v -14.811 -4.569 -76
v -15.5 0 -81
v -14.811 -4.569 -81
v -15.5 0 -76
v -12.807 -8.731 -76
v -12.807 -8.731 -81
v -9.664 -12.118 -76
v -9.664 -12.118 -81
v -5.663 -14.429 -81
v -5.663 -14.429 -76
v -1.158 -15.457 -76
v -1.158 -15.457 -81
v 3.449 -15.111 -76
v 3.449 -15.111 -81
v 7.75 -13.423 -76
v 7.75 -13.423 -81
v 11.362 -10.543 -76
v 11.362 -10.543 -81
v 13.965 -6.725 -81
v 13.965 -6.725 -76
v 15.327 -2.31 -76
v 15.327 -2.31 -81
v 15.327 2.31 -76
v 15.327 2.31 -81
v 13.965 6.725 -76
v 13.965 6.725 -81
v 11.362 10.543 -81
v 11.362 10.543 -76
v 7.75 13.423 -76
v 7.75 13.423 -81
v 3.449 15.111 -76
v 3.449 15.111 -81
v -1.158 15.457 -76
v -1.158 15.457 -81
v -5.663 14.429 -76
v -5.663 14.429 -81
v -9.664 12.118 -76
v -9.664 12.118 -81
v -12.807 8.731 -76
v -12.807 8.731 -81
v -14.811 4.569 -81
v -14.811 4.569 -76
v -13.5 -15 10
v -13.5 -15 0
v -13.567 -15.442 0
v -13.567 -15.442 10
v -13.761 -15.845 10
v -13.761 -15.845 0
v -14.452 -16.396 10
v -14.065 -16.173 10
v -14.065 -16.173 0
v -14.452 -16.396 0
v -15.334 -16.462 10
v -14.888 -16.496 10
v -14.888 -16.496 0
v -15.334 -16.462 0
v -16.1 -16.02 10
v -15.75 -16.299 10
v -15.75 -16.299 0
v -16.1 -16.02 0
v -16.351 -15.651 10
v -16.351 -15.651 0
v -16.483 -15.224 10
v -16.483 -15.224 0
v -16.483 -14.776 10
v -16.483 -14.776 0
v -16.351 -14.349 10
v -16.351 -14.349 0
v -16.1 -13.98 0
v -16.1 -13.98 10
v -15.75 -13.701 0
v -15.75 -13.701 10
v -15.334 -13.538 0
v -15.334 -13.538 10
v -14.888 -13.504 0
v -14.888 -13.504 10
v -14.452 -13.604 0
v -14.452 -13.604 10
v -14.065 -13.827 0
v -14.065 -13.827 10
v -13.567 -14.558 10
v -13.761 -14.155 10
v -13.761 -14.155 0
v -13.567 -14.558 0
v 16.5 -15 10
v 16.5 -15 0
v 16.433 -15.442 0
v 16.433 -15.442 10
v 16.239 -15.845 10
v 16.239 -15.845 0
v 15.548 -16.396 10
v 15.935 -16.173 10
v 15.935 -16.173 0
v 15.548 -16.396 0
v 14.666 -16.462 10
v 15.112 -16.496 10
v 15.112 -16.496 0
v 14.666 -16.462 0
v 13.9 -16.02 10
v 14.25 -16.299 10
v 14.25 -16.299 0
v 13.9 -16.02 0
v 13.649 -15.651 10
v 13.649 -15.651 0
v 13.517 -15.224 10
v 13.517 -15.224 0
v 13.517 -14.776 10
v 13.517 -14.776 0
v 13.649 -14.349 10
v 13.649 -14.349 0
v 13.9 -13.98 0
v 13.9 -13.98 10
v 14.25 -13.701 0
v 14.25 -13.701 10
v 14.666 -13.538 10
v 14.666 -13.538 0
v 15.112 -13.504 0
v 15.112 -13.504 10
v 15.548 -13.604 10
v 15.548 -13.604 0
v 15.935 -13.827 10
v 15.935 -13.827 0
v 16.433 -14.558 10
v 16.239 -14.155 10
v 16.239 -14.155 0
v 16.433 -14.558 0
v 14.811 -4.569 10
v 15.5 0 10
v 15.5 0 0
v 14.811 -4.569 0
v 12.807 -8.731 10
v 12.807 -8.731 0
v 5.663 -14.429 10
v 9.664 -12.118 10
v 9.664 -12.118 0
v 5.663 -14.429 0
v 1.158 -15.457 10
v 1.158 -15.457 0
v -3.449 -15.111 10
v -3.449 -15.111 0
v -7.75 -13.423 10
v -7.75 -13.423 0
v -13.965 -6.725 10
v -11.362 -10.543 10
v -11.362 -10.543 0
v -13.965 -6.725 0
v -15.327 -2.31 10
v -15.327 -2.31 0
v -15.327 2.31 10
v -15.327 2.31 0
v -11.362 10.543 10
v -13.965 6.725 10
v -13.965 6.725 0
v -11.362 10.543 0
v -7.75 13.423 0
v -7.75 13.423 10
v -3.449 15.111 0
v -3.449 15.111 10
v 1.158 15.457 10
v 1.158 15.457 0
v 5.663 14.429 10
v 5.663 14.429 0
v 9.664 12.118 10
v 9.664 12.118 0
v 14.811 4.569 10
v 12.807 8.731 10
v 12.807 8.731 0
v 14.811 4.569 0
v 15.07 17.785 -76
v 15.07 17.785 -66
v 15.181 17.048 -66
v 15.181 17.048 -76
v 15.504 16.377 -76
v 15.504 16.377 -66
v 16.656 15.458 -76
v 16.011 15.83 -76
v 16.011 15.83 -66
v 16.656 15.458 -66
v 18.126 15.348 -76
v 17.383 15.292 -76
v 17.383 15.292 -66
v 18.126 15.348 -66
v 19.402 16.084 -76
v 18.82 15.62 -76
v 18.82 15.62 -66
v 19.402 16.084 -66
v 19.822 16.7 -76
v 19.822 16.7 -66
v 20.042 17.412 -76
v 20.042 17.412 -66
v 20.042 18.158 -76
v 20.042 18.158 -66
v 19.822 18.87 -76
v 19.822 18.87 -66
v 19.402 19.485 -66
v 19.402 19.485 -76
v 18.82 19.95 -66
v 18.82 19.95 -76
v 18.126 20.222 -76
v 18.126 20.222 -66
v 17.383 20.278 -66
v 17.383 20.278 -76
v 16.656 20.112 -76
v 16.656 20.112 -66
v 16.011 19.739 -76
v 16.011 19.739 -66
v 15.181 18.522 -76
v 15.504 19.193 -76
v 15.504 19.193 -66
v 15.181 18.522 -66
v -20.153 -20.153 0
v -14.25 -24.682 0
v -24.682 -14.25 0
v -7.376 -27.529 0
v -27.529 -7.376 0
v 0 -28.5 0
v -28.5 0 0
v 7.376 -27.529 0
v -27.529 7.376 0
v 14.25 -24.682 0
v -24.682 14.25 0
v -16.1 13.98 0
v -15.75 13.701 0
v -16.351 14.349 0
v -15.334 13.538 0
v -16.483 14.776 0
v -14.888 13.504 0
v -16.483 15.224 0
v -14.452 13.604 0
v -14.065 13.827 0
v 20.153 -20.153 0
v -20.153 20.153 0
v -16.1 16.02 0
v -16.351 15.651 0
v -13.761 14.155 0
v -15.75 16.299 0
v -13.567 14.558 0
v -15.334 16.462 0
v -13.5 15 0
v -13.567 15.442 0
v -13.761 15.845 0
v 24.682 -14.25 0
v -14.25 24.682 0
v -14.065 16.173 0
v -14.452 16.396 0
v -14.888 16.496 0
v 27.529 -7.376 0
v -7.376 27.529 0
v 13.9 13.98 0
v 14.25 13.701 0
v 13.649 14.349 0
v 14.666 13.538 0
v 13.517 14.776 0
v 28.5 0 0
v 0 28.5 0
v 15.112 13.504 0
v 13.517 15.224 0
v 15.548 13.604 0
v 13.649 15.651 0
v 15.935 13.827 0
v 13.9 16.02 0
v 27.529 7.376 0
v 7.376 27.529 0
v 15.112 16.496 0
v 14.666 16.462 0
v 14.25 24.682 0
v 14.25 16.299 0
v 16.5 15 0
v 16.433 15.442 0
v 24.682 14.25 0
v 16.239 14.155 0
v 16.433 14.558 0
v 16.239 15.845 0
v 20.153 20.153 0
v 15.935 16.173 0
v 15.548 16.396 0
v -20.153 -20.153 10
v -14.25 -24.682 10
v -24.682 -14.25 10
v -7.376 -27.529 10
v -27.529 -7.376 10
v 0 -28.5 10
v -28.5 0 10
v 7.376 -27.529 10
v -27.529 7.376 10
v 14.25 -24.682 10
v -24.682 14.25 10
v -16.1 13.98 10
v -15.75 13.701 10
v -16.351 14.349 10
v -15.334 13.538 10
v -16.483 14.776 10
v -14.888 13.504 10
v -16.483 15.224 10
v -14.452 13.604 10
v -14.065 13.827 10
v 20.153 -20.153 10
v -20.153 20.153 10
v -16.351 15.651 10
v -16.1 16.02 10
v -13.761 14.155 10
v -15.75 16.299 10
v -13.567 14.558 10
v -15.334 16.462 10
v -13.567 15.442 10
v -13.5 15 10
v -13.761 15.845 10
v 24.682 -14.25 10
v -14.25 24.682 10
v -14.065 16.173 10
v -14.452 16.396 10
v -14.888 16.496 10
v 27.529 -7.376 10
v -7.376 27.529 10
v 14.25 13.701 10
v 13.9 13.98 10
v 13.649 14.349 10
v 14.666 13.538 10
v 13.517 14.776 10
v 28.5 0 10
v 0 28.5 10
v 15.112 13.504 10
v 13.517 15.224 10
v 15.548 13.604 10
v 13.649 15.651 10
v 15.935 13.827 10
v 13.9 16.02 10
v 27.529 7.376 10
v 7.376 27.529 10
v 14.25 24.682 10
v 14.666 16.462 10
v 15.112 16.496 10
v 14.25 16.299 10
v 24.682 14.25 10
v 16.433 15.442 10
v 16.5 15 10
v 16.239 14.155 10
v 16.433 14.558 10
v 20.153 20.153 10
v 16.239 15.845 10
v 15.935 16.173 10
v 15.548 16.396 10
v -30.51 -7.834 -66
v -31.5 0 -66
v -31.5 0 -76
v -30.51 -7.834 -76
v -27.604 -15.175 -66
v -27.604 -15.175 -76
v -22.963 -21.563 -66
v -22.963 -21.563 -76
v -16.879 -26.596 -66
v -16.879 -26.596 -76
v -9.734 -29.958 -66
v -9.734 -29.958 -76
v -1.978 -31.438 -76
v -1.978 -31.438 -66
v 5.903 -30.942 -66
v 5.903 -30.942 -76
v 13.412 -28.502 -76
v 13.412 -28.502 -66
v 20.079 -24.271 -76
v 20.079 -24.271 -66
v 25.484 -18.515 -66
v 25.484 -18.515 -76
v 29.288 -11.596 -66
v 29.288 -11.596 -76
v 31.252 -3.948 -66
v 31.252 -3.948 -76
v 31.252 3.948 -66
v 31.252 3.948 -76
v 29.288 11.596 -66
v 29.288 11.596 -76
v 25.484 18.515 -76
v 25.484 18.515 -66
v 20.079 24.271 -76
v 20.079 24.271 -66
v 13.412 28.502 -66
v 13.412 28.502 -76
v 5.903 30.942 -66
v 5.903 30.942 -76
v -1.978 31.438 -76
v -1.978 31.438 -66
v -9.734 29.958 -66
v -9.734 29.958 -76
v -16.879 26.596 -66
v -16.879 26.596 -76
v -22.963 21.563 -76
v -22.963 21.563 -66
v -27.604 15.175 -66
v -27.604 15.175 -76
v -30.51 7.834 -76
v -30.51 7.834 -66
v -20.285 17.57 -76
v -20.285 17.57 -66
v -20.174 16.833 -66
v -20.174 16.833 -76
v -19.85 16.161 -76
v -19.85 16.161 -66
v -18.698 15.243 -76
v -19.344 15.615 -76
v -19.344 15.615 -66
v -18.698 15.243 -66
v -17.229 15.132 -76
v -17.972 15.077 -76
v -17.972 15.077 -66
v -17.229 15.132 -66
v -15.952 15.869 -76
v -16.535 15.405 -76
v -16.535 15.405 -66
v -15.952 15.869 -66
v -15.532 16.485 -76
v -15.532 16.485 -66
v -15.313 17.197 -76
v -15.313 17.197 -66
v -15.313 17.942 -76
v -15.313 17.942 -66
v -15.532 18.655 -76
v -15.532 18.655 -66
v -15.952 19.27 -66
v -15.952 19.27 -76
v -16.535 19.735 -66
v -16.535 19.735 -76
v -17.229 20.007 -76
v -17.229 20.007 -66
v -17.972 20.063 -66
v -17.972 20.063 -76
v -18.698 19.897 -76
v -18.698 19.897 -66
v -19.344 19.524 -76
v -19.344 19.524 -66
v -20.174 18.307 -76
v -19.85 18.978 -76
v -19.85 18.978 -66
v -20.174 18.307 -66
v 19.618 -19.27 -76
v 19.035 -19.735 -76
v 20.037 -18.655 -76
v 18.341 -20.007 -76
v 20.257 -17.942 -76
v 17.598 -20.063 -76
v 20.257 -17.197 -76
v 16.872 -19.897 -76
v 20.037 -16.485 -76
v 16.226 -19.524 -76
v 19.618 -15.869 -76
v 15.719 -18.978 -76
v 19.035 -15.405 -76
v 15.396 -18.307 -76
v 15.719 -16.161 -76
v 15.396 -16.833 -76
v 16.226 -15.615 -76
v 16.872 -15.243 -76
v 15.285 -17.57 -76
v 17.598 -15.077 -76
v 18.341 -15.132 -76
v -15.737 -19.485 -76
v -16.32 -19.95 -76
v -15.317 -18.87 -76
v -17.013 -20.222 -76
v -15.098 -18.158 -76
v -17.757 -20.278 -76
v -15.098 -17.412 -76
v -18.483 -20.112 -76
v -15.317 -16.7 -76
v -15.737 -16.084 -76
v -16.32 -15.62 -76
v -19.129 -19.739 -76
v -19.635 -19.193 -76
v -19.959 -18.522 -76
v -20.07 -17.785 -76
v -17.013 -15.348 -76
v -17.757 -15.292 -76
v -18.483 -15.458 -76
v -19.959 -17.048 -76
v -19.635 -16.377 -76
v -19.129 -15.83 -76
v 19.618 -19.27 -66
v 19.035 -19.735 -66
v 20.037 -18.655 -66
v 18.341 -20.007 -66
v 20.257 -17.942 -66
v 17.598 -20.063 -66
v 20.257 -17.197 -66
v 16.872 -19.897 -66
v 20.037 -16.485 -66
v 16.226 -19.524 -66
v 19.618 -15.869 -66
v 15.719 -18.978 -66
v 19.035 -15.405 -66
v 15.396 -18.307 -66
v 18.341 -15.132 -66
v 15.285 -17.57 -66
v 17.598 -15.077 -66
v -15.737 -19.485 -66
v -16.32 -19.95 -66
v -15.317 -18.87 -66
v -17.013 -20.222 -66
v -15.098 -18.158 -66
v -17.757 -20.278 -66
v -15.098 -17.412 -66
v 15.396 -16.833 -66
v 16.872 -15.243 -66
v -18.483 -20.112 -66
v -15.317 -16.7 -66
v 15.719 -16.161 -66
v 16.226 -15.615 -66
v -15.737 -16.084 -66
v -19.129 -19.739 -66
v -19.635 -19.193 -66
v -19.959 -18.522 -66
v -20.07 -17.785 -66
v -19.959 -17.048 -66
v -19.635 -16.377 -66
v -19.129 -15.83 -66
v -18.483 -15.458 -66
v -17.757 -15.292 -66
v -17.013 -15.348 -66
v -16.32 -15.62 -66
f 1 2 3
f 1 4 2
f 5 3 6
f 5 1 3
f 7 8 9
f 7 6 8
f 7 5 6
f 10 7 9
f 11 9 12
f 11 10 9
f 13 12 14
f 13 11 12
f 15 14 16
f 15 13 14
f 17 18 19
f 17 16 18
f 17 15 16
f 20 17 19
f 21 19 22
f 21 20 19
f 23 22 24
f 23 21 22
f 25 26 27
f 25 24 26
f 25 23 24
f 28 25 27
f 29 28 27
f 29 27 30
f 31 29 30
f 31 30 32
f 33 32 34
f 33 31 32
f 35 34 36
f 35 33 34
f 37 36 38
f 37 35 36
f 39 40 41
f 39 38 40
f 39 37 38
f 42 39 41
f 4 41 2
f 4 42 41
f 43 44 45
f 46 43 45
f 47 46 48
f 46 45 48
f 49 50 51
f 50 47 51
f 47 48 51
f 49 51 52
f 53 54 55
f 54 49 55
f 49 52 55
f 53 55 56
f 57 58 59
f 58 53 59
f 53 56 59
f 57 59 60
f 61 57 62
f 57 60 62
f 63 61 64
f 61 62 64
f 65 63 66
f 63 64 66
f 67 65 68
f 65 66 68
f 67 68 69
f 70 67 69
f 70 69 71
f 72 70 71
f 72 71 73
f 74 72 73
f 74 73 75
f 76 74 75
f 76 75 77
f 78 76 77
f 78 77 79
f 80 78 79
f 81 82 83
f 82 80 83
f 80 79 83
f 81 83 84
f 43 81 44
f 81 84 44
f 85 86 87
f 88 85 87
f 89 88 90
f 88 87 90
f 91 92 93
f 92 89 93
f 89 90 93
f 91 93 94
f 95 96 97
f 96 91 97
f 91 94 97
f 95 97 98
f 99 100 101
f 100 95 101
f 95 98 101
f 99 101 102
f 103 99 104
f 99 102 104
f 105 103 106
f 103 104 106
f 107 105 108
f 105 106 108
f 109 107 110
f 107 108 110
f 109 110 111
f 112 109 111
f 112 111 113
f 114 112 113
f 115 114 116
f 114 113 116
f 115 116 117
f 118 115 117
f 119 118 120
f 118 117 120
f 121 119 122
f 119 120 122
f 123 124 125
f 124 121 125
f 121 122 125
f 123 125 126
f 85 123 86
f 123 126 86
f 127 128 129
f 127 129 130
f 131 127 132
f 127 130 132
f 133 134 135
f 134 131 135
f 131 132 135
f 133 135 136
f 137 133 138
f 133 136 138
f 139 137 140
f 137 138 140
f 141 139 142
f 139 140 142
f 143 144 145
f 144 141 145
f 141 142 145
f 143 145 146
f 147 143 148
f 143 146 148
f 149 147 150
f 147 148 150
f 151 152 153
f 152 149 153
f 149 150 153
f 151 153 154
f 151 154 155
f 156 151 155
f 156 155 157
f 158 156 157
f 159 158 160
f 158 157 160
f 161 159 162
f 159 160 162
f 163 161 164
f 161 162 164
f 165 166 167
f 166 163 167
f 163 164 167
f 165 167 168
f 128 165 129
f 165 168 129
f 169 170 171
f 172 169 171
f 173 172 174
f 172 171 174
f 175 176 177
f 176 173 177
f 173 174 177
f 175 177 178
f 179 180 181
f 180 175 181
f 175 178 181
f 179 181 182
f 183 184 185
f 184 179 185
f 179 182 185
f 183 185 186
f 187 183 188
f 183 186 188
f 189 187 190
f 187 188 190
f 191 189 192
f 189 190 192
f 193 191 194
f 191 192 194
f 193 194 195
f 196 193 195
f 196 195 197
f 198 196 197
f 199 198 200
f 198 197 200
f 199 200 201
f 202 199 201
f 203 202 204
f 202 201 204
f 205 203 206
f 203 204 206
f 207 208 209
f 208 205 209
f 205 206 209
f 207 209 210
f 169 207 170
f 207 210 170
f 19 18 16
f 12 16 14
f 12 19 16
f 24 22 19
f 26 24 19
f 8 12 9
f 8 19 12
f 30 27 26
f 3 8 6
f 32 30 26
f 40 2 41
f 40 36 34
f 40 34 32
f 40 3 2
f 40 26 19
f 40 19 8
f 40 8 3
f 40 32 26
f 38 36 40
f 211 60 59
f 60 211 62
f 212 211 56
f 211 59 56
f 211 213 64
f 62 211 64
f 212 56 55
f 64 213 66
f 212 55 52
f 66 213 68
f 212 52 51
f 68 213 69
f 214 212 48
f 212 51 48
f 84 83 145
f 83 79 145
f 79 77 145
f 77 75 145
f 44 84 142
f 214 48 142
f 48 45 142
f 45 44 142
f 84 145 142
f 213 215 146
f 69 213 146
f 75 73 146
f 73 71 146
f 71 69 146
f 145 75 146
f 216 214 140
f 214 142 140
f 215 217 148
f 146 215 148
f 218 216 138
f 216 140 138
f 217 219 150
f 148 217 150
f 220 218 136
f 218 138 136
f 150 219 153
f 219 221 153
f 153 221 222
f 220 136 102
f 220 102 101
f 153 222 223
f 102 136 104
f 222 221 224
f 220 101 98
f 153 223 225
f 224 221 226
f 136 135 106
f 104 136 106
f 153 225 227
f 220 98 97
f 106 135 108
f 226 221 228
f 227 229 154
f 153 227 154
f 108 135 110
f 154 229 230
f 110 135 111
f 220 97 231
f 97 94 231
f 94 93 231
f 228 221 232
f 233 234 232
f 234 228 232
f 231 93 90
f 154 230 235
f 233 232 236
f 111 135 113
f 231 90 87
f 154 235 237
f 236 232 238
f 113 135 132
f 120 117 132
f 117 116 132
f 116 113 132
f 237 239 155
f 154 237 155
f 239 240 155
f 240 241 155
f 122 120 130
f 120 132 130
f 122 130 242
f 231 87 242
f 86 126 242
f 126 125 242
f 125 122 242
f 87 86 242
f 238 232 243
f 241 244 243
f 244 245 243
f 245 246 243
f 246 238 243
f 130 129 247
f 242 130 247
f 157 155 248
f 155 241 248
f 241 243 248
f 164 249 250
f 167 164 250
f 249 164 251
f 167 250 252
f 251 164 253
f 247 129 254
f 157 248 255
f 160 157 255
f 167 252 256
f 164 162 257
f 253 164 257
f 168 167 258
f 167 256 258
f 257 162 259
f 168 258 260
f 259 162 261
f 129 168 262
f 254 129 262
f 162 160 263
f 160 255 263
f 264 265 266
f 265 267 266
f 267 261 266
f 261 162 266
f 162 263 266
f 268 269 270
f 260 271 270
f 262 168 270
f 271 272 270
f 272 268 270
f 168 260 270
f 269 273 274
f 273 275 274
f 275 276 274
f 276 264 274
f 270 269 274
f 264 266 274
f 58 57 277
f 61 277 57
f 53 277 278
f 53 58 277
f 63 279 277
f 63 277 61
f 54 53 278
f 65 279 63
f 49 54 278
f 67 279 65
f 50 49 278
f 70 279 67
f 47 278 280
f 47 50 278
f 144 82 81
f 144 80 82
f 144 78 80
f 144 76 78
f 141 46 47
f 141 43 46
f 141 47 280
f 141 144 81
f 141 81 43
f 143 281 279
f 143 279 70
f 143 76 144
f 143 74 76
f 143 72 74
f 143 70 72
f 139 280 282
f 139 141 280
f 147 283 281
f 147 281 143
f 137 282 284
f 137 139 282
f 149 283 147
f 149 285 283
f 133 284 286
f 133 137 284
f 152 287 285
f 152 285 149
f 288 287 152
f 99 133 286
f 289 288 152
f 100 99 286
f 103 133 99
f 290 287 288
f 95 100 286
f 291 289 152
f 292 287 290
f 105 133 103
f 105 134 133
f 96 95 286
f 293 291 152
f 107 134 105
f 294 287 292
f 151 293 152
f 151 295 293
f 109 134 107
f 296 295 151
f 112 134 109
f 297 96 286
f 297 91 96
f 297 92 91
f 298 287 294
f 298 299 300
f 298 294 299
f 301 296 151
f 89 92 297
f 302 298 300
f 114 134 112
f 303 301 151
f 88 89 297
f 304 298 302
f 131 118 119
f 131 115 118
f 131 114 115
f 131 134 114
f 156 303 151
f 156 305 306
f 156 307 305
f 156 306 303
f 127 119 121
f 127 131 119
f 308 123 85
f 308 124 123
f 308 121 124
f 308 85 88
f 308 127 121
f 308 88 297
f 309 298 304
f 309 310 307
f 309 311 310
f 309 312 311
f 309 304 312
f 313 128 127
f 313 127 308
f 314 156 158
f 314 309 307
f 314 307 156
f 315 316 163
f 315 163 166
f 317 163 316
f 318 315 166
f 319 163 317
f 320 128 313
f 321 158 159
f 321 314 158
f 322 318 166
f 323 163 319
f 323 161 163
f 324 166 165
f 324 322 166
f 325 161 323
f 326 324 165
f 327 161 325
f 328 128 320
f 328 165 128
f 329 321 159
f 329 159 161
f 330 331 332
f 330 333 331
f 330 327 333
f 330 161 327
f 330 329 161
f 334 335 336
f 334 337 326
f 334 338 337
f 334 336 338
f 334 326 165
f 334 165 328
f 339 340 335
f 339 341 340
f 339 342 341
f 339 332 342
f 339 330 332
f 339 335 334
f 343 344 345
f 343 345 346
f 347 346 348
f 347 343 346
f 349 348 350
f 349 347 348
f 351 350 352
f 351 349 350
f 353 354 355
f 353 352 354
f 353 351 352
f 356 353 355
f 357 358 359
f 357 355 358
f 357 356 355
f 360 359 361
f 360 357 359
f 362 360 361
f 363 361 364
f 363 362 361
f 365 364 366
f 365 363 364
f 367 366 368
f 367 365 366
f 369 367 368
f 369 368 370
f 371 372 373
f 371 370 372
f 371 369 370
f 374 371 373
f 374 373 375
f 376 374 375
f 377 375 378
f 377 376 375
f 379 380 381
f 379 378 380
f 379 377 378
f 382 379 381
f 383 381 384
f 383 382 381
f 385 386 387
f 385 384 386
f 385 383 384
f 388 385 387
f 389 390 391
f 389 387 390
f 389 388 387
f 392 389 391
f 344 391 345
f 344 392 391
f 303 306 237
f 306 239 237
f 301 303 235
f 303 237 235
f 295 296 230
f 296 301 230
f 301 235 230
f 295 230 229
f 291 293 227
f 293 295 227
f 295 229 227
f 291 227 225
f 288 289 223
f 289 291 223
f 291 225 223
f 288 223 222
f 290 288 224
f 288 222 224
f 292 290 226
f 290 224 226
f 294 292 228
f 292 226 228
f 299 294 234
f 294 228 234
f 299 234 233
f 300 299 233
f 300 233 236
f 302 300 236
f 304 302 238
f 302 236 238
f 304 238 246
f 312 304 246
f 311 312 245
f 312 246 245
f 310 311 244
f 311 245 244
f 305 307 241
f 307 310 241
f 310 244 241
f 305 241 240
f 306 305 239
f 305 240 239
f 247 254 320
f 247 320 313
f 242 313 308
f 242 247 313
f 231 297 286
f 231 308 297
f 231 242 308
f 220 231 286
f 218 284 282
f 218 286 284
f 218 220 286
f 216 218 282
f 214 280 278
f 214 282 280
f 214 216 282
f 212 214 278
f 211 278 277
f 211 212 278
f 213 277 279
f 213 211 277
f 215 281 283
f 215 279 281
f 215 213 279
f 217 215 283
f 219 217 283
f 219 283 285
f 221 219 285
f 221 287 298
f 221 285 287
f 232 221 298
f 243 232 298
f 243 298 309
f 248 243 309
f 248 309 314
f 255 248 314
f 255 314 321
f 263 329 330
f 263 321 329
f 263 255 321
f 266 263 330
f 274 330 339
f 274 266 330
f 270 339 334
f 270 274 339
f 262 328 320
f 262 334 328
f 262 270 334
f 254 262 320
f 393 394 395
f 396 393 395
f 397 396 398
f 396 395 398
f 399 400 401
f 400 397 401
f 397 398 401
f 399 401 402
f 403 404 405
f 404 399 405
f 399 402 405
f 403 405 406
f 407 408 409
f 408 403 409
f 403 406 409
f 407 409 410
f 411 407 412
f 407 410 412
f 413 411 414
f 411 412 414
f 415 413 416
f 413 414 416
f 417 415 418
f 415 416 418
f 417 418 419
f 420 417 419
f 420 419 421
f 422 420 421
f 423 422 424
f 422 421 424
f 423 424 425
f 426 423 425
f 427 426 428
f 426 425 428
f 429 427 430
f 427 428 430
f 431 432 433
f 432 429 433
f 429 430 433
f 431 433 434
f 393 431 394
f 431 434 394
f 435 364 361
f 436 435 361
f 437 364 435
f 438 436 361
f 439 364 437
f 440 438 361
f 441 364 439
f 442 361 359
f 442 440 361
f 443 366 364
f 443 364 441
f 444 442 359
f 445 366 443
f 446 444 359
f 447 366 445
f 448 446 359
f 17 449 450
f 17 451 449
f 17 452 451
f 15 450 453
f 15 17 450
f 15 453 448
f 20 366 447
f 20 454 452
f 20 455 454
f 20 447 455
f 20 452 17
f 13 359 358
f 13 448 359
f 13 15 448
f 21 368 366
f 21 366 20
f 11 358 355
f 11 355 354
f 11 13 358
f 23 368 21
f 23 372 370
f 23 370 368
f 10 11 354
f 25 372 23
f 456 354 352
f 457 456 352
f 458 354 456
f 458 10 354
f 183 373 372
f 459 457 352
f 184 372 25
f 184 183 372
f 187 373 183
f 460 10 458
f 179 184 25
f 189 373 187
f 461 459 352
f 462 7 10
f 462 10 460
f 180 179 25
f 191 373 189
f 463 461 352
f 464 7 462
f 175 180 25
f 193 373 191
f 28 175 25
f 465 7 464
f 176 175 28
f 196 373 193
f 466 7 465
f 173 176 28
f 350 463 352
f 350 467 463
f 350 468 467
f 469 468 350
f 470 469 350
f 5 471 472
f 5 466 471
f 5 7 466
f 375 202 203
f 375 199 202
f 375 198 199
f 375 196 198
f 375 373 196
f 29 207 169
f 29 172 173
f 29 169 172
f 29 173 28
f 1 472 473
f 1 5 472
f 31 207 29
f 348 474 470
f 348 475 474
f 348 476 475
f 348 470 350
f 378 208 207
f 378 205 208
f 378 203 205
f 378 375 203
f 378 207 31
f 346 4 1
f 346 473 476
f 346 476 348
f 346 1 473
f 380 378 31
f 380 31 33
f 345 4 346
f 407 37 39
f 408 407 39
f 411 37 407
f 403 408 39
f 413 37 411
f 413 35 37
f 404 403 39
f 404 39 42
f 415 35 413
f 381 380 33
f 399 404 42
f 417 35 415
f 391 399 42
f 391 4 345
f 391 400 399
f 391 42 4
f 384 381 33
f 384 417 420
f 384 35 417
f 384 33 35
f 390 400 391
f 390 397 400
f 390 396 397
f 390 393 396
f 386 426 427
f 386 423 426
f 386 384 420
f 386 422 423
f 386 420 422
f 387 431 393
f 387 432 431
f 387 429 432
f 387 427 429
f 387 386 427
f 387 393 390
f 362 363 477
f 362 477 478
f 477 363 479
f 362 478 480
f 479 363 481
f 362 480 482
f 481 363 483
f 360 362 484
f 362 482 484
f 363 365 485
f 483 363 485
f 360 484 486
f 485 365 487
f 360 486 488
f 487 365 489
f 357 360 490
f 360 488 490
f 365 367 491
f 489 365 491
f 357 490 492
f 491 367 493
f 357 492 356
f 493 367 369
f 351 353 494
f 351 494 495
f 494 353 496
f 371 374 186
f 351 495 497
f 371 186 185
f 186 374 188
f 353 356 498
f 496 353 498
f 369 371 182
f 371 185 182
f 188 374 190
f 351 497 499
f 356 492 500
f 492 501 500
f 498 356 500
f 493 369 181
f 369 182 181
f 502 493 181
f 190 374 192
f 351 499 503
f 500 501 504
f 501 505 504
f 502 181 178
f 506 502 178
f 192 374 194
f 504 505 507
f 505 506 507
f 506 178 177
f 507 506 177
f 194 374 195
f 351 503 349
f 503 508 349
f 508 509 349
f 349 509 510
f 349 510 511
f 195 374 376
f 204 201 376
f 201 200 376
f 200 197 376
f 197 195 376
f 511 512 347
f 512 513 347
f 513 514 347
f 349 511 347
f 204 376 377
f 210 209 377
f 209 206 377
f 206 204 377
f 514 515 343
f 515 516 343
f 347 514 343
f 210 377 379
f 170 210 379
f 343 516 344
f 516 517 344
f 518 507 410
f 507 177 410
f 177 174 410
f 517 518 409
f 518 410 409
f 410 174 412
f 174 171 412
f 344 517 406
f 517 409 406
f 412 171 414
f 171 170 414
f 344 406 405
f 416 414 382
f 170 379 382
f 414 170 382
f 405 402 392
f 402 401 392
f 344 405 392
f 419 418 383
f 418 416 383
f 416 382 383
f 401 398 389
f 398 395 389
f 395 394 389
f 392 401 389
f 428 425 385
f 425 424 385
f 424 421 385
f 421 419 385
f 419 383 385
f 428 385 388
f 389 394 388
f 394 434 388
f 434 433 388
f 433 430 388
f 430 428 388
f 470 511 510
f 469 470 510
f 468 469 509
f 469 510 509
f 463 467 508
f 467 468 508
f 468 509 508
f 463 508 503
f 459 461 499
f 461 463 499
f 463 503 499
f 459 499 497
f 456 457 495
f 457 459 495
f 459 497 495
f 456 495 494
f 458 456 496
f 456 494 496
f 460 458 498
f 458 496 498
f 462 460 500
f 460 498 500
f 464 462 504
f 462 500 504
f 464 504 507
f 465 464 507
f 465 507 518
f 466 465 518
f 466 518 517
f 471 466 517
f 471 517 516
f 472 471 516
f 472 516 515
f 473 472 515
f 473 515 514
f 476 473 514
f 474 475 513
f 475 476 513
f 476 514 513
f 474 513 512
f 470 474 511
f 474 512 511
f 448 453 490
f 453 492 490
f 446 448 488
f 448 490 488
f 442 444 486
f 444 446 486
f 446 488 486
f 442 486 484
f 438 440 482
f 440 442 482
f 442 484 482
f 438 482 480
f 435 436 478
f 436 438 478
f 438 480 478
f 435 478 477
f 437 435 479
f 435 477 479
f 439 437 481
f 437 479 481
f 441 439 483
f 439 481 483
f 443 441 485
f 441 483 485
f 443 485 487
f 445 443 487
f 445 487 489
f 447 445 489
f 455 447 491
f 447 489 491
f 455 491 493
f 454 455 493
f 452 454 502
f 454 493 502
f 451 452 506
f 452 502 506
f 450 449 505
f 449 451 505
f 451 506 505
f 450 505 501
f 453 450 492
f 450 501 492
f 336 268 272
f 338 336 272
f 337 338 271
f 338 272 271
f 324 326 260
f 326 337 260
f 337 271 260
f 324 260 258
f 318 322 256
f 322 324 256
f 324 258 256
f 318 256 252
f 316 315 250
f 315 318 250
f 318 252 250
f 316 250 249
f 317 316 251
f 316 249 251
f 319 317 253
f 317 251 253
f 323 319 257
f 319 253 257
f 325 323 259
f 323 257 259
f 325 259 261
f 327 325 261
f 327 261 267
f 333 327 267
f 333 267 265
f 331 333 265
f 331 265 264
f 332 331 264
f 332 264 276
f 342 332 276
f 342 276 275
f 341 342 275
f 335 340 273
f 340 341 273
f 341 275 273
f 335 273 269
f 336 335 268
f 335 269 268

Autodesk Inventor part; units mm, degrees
ref_plane "YZ Plane" through (0, 0, 0) normal (1, 0, 0) x (0, 1, 0)
ref_plane "XZ Plane" through (0, 0, 0) normal (0, 1, 0) x (-1, 0, 0)
ref_plane "XY Plane" through (0, 0, 0) normal (0, 0, 1) x (1, 0, 0)
sketch "Sketch1" plane through (0, 0, 0) normal (0, 0, 1) x (1, 0, 0)
  circle A0 centre (0, 0) radius 28.5
  circle A1 centre (0, 0) radius 15.5
  circle A2 centre (-15, 15) radius 1.5
  circle A3 centre (15, 15) radius 1.5
  circle A4 centre (15, -15) radius 1.5
  circle A5 centre (-15, -15) radius 1.5
  dimension "d0" = 57
  dimension "d1" = 31
  dimension "d6" = 3
  dimension "d7" = 3
  dimension "d8" = 3
  dimension "d9" = 3
extrude "Extrusion1" add sketch "Sketch1" along normal blind 10
ref_plane "Work Plane14" through (0, 0, -66) normal (0, 0, -1) x (-1, 0, 0)
sketch "Sketch2" plane through (0, 0, -66) normal (0, 0, -1) x (-1, 0, 0)
  circle A0 centre (0, 0) radius 31.5
  circle A1 centre (0, 0) radius 16.75
  circle A2 centre (17.7849, 17.5698) radius 2.5
  circle A3 centre (-17.5698, 17.7849) radius 2.5
  circle A4 centre (-17.7849, -17.5698) radius 2.5
  circle A5 centre (17.5698, -17.7849) radius 2.5
  dimension "d13" = 63
  dimension "d14" = 33.5
  dimension "d16" = 5
  dimension "d19" = 360
extrude "Extrusion2" add sketch "Sketch2" along normal blind 10
sketch "Sketch3" plane through (0, 0, 10) normal (0, 0, 1) x (1, 0, 0)
  point P0 (0, 0)
ref_plane "Work Plane28" through (0, 0, -66) normal (0, 0, -1) x (-1, 0, 0)
sketch "Sketch4" plane through (0, 0, -66) normal (0, 0, -1) x (-1, 0, 0)
  circle A0 centre (0, 0) radius 16.75
  dimension "d23" = 33.5
extrude "Extrusion3" add sketch "Sketch4" along normal blind 10
ref_plane "Work Plane27" through (0, 0, -76) normal (0, 0, -1) x (-1, 0, 0)
sketch "Sketch5" plane through (0, 0, -76) normal (0, 0, -1) x (-1, 0, 0)
  circle A0 centre (0, 0) radius 15.5
  dimension "d26" = 31
extrude "Extrusion4" add sketch "Sketch5" along normal blind 5
sketch "Sketch12" plane through (0, 0, 10) normal (0, 0, 1) x (1, 0, 0)
  point P0 (0, 0)
properties part number "LightBracket"
